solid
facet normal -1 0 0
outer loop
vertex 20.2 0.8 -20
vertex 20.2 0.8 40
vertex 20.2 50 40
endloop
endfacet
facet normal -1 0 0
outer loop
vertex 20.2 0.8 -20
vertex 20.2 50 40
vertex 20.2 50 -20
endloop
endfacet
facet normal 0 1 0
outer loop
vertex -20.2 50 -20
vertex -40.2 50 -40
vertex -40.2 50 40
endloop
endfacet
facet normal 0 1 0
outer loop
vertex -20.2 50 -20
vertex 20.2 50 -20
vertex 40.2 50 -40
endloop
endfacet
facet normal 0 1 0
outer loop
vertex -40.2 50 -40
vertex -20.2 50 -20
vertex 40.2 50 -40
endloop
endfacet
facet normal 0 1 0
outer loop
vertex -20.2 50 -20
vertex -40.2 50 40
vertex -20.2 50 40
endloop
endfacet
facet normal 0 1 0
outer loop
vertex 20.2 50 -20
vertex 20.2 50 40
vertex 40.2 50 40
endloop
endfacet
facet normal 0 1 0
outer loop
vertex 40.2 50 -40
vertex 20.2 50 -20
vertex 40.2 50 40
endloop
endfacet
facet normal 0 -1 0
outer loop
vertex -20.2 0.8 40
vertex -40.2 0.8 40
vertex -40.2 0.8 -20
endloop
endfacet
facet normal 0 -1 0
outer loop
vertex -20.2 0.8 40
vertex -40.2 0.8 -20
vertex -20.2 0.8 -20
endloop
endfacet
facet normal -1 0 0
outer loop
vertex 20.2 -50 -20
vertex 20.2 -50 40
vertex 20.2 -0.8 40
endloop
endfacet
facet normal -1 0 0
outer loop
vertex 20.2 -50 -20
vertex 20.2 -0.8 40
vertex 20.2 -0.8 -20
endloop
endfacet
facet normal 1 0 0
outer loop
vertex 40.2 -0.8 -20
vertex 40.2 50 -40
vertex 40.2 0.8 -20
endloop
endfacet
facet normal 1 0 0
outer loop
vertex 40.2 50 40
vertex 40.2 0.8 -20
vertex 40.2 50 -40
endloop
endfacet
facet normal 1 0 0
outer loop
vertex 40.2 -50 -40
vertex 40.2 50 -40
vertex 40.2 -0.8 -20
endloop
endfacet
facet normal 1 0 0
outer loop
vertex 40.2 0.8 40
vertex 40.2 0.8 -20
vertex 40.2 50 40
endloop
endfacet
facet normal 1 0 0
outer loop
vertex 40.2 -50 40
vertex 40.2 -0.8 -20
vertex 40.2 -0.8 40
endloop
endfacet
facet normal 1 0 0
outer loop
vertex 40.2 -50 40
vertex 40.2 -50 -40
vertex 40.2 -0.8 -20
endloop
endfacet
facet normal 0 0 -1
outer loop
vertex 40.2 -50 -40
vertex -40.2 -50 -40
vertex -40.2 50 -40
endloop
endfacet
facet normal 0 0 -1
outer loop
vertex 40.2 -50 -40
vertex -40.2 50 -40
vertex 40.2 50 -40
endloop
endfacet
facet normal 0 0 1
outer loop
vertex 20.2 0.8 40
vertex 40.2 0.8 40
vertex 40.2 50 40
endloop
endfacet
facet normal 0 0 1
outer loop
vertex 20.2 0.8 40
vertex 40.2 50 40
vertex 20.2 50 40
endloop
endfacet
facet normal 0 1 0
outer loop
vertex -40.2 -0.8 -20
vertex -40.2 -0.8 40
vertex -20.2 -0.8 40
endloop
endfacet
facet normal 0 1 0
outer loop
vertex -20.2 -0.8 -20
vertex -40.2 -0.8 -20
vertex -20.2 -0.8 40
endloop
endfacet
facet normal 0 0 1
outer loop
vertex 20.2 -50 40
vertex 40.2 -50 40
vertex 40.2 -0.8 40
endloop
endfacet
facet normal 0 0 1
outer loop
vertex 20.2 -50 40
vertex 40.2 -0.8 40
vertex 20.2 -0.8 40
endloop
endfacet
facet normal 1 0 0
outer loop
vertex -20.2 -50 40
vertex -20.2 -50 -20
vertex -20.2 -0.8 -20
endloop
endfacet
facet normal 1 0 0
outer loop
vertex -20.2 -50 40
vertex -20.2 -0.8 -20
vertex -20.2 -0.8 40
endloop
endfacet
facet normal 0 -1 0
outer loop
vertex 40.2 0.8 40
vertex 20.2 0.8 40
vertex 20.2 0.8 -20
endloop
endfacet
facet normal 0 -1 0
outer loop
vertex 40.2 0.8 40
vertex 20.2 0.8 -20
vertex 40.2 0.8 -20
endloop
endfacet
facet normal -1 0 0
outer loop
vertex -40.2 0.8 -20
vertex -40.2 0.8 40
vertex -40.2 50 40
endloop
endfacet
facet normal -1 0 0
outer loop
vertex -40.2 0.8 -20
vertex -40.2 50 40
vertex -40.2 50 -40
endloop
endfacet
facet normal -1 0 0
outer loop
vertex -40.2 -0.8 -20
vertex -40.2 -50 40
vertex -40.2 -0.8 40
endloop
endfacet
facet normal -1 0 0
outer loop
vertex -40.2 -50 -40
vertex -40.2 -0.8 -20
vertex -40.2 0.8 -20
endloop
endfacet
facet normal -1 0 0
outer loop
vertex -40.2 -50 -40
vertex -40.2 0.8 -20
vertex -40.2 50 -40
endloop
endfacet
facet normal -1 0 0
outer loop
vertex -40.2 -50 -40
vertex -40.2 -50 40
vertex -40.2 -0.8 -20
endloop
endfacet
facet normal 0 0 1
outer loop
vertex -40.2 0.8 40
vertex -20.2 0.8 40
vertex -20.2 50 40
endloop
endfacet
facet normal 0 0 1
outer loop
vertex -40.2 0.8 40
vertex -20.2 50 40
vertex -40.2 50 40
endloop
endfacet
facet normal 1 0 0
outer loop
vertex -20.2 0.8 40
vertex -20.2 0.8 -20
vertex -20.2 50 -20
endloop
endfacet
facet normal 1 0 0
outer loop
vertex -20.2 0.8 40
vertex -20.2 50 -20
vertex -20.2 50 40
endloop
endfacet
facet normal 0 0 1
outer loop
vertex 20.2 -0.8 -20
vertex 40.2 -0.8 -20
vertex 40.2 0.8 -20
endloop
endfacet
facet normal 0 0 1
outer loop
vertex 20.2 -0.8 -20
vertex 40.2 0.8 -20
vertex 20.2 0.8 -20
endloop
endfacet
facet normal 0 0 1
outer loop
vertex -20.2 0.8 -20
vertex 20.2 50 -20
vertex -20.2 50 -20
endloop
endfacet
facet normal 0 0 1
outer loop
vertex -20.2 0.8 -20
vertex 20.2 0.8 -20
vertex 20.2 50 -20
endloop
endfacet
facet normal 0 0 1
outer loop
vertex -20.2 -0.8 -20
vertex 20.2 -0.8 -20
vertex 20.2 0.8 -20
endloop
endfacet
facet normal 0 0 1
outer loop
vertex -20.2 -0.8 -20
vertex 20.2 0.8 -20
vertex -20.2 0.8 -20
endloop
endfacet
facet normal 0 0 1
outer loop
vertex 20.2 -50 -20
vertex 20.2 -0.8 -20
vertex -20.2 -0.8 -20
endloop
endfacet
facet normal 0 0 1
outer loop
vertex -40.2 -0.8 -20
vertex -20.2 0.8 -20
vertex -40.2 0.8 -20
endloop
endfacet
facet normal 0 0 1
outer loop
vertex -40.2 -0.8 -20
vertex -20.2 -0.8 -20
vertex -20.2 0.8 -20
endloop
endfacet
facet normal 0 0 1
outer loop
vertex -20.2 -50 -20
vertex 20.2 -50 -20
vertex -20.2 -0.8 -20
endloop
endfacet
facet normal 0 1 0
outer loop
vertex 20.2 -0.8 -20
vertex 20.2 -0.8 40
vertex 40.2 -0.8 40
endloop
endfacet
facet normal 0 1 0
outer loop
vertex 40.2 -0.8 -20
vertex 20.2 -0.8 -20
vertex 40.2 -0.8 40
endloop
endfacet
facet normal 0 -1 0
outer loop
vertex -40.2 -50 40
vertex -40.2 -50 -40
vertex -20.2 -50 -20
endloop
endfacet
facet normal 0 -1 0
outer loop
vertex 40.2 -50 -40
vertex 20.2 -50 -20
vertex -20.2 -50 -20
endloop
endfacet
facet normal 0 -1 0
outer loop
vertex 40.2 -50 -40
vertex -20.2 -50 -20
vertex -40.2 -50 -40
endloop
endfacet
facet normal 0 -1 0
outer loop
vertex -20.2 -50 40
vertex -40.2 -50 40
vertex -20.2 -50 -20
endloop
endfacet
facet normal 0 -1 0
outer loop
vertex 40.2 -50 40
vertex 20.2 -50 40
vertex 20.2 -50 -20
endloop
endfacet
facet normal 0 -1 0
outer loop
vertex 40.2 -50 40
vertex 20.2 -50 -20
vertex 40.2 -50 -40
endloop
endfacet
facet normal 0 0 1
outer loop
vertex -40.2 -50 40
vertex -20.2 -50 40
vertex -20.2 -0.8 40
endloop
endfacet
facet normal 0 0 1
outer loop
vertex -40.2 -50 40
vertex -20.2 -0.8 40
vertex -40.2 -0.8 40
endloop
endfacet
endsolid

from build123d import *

# Parameters (mm, degrees)
F1_DEPTH = 50
F2_DEPTH = 0.8


with BuildPart() as f1:
    # F0 (on Front) → F1 (new body, symmetric)
    with BuildSketch(Plane.XZ):
        Polygon((-20.2, -20), (-20.2, 20), (-20.2, 40), (-40.2, 40), (-40.2, -20), align=None)
        Polygon((40.2, -20), (20.2, -20), (-20.2, -20), (-40.2, -20), (-40.2, -40), (40.2, -40), align=None)
        Polygon((20.2, 40), (20.2, 20), (20.2, -20), (40.2, -20), (40.2, 40), align=None)
    extrude(amount=F1_DEPTH, both=True)

    # F0 (on Front) → F2 (cut, symmetric)
    with BuildSketch(Plane.XZ):
        Polygon((-20.2, -20), (-20.2, 20), (-20.2, 40), (-40.2, 40), (-40.2, -20), align=None)
        Polygon((20.2, 40), (20.2, 20), (20.2, -20), (40.2, -20), (40.2, 40), align=None)
    extrude(amount=F2_DEPTH, both=True, mode=Mode.SUBTRACT)


solid = f1.part
